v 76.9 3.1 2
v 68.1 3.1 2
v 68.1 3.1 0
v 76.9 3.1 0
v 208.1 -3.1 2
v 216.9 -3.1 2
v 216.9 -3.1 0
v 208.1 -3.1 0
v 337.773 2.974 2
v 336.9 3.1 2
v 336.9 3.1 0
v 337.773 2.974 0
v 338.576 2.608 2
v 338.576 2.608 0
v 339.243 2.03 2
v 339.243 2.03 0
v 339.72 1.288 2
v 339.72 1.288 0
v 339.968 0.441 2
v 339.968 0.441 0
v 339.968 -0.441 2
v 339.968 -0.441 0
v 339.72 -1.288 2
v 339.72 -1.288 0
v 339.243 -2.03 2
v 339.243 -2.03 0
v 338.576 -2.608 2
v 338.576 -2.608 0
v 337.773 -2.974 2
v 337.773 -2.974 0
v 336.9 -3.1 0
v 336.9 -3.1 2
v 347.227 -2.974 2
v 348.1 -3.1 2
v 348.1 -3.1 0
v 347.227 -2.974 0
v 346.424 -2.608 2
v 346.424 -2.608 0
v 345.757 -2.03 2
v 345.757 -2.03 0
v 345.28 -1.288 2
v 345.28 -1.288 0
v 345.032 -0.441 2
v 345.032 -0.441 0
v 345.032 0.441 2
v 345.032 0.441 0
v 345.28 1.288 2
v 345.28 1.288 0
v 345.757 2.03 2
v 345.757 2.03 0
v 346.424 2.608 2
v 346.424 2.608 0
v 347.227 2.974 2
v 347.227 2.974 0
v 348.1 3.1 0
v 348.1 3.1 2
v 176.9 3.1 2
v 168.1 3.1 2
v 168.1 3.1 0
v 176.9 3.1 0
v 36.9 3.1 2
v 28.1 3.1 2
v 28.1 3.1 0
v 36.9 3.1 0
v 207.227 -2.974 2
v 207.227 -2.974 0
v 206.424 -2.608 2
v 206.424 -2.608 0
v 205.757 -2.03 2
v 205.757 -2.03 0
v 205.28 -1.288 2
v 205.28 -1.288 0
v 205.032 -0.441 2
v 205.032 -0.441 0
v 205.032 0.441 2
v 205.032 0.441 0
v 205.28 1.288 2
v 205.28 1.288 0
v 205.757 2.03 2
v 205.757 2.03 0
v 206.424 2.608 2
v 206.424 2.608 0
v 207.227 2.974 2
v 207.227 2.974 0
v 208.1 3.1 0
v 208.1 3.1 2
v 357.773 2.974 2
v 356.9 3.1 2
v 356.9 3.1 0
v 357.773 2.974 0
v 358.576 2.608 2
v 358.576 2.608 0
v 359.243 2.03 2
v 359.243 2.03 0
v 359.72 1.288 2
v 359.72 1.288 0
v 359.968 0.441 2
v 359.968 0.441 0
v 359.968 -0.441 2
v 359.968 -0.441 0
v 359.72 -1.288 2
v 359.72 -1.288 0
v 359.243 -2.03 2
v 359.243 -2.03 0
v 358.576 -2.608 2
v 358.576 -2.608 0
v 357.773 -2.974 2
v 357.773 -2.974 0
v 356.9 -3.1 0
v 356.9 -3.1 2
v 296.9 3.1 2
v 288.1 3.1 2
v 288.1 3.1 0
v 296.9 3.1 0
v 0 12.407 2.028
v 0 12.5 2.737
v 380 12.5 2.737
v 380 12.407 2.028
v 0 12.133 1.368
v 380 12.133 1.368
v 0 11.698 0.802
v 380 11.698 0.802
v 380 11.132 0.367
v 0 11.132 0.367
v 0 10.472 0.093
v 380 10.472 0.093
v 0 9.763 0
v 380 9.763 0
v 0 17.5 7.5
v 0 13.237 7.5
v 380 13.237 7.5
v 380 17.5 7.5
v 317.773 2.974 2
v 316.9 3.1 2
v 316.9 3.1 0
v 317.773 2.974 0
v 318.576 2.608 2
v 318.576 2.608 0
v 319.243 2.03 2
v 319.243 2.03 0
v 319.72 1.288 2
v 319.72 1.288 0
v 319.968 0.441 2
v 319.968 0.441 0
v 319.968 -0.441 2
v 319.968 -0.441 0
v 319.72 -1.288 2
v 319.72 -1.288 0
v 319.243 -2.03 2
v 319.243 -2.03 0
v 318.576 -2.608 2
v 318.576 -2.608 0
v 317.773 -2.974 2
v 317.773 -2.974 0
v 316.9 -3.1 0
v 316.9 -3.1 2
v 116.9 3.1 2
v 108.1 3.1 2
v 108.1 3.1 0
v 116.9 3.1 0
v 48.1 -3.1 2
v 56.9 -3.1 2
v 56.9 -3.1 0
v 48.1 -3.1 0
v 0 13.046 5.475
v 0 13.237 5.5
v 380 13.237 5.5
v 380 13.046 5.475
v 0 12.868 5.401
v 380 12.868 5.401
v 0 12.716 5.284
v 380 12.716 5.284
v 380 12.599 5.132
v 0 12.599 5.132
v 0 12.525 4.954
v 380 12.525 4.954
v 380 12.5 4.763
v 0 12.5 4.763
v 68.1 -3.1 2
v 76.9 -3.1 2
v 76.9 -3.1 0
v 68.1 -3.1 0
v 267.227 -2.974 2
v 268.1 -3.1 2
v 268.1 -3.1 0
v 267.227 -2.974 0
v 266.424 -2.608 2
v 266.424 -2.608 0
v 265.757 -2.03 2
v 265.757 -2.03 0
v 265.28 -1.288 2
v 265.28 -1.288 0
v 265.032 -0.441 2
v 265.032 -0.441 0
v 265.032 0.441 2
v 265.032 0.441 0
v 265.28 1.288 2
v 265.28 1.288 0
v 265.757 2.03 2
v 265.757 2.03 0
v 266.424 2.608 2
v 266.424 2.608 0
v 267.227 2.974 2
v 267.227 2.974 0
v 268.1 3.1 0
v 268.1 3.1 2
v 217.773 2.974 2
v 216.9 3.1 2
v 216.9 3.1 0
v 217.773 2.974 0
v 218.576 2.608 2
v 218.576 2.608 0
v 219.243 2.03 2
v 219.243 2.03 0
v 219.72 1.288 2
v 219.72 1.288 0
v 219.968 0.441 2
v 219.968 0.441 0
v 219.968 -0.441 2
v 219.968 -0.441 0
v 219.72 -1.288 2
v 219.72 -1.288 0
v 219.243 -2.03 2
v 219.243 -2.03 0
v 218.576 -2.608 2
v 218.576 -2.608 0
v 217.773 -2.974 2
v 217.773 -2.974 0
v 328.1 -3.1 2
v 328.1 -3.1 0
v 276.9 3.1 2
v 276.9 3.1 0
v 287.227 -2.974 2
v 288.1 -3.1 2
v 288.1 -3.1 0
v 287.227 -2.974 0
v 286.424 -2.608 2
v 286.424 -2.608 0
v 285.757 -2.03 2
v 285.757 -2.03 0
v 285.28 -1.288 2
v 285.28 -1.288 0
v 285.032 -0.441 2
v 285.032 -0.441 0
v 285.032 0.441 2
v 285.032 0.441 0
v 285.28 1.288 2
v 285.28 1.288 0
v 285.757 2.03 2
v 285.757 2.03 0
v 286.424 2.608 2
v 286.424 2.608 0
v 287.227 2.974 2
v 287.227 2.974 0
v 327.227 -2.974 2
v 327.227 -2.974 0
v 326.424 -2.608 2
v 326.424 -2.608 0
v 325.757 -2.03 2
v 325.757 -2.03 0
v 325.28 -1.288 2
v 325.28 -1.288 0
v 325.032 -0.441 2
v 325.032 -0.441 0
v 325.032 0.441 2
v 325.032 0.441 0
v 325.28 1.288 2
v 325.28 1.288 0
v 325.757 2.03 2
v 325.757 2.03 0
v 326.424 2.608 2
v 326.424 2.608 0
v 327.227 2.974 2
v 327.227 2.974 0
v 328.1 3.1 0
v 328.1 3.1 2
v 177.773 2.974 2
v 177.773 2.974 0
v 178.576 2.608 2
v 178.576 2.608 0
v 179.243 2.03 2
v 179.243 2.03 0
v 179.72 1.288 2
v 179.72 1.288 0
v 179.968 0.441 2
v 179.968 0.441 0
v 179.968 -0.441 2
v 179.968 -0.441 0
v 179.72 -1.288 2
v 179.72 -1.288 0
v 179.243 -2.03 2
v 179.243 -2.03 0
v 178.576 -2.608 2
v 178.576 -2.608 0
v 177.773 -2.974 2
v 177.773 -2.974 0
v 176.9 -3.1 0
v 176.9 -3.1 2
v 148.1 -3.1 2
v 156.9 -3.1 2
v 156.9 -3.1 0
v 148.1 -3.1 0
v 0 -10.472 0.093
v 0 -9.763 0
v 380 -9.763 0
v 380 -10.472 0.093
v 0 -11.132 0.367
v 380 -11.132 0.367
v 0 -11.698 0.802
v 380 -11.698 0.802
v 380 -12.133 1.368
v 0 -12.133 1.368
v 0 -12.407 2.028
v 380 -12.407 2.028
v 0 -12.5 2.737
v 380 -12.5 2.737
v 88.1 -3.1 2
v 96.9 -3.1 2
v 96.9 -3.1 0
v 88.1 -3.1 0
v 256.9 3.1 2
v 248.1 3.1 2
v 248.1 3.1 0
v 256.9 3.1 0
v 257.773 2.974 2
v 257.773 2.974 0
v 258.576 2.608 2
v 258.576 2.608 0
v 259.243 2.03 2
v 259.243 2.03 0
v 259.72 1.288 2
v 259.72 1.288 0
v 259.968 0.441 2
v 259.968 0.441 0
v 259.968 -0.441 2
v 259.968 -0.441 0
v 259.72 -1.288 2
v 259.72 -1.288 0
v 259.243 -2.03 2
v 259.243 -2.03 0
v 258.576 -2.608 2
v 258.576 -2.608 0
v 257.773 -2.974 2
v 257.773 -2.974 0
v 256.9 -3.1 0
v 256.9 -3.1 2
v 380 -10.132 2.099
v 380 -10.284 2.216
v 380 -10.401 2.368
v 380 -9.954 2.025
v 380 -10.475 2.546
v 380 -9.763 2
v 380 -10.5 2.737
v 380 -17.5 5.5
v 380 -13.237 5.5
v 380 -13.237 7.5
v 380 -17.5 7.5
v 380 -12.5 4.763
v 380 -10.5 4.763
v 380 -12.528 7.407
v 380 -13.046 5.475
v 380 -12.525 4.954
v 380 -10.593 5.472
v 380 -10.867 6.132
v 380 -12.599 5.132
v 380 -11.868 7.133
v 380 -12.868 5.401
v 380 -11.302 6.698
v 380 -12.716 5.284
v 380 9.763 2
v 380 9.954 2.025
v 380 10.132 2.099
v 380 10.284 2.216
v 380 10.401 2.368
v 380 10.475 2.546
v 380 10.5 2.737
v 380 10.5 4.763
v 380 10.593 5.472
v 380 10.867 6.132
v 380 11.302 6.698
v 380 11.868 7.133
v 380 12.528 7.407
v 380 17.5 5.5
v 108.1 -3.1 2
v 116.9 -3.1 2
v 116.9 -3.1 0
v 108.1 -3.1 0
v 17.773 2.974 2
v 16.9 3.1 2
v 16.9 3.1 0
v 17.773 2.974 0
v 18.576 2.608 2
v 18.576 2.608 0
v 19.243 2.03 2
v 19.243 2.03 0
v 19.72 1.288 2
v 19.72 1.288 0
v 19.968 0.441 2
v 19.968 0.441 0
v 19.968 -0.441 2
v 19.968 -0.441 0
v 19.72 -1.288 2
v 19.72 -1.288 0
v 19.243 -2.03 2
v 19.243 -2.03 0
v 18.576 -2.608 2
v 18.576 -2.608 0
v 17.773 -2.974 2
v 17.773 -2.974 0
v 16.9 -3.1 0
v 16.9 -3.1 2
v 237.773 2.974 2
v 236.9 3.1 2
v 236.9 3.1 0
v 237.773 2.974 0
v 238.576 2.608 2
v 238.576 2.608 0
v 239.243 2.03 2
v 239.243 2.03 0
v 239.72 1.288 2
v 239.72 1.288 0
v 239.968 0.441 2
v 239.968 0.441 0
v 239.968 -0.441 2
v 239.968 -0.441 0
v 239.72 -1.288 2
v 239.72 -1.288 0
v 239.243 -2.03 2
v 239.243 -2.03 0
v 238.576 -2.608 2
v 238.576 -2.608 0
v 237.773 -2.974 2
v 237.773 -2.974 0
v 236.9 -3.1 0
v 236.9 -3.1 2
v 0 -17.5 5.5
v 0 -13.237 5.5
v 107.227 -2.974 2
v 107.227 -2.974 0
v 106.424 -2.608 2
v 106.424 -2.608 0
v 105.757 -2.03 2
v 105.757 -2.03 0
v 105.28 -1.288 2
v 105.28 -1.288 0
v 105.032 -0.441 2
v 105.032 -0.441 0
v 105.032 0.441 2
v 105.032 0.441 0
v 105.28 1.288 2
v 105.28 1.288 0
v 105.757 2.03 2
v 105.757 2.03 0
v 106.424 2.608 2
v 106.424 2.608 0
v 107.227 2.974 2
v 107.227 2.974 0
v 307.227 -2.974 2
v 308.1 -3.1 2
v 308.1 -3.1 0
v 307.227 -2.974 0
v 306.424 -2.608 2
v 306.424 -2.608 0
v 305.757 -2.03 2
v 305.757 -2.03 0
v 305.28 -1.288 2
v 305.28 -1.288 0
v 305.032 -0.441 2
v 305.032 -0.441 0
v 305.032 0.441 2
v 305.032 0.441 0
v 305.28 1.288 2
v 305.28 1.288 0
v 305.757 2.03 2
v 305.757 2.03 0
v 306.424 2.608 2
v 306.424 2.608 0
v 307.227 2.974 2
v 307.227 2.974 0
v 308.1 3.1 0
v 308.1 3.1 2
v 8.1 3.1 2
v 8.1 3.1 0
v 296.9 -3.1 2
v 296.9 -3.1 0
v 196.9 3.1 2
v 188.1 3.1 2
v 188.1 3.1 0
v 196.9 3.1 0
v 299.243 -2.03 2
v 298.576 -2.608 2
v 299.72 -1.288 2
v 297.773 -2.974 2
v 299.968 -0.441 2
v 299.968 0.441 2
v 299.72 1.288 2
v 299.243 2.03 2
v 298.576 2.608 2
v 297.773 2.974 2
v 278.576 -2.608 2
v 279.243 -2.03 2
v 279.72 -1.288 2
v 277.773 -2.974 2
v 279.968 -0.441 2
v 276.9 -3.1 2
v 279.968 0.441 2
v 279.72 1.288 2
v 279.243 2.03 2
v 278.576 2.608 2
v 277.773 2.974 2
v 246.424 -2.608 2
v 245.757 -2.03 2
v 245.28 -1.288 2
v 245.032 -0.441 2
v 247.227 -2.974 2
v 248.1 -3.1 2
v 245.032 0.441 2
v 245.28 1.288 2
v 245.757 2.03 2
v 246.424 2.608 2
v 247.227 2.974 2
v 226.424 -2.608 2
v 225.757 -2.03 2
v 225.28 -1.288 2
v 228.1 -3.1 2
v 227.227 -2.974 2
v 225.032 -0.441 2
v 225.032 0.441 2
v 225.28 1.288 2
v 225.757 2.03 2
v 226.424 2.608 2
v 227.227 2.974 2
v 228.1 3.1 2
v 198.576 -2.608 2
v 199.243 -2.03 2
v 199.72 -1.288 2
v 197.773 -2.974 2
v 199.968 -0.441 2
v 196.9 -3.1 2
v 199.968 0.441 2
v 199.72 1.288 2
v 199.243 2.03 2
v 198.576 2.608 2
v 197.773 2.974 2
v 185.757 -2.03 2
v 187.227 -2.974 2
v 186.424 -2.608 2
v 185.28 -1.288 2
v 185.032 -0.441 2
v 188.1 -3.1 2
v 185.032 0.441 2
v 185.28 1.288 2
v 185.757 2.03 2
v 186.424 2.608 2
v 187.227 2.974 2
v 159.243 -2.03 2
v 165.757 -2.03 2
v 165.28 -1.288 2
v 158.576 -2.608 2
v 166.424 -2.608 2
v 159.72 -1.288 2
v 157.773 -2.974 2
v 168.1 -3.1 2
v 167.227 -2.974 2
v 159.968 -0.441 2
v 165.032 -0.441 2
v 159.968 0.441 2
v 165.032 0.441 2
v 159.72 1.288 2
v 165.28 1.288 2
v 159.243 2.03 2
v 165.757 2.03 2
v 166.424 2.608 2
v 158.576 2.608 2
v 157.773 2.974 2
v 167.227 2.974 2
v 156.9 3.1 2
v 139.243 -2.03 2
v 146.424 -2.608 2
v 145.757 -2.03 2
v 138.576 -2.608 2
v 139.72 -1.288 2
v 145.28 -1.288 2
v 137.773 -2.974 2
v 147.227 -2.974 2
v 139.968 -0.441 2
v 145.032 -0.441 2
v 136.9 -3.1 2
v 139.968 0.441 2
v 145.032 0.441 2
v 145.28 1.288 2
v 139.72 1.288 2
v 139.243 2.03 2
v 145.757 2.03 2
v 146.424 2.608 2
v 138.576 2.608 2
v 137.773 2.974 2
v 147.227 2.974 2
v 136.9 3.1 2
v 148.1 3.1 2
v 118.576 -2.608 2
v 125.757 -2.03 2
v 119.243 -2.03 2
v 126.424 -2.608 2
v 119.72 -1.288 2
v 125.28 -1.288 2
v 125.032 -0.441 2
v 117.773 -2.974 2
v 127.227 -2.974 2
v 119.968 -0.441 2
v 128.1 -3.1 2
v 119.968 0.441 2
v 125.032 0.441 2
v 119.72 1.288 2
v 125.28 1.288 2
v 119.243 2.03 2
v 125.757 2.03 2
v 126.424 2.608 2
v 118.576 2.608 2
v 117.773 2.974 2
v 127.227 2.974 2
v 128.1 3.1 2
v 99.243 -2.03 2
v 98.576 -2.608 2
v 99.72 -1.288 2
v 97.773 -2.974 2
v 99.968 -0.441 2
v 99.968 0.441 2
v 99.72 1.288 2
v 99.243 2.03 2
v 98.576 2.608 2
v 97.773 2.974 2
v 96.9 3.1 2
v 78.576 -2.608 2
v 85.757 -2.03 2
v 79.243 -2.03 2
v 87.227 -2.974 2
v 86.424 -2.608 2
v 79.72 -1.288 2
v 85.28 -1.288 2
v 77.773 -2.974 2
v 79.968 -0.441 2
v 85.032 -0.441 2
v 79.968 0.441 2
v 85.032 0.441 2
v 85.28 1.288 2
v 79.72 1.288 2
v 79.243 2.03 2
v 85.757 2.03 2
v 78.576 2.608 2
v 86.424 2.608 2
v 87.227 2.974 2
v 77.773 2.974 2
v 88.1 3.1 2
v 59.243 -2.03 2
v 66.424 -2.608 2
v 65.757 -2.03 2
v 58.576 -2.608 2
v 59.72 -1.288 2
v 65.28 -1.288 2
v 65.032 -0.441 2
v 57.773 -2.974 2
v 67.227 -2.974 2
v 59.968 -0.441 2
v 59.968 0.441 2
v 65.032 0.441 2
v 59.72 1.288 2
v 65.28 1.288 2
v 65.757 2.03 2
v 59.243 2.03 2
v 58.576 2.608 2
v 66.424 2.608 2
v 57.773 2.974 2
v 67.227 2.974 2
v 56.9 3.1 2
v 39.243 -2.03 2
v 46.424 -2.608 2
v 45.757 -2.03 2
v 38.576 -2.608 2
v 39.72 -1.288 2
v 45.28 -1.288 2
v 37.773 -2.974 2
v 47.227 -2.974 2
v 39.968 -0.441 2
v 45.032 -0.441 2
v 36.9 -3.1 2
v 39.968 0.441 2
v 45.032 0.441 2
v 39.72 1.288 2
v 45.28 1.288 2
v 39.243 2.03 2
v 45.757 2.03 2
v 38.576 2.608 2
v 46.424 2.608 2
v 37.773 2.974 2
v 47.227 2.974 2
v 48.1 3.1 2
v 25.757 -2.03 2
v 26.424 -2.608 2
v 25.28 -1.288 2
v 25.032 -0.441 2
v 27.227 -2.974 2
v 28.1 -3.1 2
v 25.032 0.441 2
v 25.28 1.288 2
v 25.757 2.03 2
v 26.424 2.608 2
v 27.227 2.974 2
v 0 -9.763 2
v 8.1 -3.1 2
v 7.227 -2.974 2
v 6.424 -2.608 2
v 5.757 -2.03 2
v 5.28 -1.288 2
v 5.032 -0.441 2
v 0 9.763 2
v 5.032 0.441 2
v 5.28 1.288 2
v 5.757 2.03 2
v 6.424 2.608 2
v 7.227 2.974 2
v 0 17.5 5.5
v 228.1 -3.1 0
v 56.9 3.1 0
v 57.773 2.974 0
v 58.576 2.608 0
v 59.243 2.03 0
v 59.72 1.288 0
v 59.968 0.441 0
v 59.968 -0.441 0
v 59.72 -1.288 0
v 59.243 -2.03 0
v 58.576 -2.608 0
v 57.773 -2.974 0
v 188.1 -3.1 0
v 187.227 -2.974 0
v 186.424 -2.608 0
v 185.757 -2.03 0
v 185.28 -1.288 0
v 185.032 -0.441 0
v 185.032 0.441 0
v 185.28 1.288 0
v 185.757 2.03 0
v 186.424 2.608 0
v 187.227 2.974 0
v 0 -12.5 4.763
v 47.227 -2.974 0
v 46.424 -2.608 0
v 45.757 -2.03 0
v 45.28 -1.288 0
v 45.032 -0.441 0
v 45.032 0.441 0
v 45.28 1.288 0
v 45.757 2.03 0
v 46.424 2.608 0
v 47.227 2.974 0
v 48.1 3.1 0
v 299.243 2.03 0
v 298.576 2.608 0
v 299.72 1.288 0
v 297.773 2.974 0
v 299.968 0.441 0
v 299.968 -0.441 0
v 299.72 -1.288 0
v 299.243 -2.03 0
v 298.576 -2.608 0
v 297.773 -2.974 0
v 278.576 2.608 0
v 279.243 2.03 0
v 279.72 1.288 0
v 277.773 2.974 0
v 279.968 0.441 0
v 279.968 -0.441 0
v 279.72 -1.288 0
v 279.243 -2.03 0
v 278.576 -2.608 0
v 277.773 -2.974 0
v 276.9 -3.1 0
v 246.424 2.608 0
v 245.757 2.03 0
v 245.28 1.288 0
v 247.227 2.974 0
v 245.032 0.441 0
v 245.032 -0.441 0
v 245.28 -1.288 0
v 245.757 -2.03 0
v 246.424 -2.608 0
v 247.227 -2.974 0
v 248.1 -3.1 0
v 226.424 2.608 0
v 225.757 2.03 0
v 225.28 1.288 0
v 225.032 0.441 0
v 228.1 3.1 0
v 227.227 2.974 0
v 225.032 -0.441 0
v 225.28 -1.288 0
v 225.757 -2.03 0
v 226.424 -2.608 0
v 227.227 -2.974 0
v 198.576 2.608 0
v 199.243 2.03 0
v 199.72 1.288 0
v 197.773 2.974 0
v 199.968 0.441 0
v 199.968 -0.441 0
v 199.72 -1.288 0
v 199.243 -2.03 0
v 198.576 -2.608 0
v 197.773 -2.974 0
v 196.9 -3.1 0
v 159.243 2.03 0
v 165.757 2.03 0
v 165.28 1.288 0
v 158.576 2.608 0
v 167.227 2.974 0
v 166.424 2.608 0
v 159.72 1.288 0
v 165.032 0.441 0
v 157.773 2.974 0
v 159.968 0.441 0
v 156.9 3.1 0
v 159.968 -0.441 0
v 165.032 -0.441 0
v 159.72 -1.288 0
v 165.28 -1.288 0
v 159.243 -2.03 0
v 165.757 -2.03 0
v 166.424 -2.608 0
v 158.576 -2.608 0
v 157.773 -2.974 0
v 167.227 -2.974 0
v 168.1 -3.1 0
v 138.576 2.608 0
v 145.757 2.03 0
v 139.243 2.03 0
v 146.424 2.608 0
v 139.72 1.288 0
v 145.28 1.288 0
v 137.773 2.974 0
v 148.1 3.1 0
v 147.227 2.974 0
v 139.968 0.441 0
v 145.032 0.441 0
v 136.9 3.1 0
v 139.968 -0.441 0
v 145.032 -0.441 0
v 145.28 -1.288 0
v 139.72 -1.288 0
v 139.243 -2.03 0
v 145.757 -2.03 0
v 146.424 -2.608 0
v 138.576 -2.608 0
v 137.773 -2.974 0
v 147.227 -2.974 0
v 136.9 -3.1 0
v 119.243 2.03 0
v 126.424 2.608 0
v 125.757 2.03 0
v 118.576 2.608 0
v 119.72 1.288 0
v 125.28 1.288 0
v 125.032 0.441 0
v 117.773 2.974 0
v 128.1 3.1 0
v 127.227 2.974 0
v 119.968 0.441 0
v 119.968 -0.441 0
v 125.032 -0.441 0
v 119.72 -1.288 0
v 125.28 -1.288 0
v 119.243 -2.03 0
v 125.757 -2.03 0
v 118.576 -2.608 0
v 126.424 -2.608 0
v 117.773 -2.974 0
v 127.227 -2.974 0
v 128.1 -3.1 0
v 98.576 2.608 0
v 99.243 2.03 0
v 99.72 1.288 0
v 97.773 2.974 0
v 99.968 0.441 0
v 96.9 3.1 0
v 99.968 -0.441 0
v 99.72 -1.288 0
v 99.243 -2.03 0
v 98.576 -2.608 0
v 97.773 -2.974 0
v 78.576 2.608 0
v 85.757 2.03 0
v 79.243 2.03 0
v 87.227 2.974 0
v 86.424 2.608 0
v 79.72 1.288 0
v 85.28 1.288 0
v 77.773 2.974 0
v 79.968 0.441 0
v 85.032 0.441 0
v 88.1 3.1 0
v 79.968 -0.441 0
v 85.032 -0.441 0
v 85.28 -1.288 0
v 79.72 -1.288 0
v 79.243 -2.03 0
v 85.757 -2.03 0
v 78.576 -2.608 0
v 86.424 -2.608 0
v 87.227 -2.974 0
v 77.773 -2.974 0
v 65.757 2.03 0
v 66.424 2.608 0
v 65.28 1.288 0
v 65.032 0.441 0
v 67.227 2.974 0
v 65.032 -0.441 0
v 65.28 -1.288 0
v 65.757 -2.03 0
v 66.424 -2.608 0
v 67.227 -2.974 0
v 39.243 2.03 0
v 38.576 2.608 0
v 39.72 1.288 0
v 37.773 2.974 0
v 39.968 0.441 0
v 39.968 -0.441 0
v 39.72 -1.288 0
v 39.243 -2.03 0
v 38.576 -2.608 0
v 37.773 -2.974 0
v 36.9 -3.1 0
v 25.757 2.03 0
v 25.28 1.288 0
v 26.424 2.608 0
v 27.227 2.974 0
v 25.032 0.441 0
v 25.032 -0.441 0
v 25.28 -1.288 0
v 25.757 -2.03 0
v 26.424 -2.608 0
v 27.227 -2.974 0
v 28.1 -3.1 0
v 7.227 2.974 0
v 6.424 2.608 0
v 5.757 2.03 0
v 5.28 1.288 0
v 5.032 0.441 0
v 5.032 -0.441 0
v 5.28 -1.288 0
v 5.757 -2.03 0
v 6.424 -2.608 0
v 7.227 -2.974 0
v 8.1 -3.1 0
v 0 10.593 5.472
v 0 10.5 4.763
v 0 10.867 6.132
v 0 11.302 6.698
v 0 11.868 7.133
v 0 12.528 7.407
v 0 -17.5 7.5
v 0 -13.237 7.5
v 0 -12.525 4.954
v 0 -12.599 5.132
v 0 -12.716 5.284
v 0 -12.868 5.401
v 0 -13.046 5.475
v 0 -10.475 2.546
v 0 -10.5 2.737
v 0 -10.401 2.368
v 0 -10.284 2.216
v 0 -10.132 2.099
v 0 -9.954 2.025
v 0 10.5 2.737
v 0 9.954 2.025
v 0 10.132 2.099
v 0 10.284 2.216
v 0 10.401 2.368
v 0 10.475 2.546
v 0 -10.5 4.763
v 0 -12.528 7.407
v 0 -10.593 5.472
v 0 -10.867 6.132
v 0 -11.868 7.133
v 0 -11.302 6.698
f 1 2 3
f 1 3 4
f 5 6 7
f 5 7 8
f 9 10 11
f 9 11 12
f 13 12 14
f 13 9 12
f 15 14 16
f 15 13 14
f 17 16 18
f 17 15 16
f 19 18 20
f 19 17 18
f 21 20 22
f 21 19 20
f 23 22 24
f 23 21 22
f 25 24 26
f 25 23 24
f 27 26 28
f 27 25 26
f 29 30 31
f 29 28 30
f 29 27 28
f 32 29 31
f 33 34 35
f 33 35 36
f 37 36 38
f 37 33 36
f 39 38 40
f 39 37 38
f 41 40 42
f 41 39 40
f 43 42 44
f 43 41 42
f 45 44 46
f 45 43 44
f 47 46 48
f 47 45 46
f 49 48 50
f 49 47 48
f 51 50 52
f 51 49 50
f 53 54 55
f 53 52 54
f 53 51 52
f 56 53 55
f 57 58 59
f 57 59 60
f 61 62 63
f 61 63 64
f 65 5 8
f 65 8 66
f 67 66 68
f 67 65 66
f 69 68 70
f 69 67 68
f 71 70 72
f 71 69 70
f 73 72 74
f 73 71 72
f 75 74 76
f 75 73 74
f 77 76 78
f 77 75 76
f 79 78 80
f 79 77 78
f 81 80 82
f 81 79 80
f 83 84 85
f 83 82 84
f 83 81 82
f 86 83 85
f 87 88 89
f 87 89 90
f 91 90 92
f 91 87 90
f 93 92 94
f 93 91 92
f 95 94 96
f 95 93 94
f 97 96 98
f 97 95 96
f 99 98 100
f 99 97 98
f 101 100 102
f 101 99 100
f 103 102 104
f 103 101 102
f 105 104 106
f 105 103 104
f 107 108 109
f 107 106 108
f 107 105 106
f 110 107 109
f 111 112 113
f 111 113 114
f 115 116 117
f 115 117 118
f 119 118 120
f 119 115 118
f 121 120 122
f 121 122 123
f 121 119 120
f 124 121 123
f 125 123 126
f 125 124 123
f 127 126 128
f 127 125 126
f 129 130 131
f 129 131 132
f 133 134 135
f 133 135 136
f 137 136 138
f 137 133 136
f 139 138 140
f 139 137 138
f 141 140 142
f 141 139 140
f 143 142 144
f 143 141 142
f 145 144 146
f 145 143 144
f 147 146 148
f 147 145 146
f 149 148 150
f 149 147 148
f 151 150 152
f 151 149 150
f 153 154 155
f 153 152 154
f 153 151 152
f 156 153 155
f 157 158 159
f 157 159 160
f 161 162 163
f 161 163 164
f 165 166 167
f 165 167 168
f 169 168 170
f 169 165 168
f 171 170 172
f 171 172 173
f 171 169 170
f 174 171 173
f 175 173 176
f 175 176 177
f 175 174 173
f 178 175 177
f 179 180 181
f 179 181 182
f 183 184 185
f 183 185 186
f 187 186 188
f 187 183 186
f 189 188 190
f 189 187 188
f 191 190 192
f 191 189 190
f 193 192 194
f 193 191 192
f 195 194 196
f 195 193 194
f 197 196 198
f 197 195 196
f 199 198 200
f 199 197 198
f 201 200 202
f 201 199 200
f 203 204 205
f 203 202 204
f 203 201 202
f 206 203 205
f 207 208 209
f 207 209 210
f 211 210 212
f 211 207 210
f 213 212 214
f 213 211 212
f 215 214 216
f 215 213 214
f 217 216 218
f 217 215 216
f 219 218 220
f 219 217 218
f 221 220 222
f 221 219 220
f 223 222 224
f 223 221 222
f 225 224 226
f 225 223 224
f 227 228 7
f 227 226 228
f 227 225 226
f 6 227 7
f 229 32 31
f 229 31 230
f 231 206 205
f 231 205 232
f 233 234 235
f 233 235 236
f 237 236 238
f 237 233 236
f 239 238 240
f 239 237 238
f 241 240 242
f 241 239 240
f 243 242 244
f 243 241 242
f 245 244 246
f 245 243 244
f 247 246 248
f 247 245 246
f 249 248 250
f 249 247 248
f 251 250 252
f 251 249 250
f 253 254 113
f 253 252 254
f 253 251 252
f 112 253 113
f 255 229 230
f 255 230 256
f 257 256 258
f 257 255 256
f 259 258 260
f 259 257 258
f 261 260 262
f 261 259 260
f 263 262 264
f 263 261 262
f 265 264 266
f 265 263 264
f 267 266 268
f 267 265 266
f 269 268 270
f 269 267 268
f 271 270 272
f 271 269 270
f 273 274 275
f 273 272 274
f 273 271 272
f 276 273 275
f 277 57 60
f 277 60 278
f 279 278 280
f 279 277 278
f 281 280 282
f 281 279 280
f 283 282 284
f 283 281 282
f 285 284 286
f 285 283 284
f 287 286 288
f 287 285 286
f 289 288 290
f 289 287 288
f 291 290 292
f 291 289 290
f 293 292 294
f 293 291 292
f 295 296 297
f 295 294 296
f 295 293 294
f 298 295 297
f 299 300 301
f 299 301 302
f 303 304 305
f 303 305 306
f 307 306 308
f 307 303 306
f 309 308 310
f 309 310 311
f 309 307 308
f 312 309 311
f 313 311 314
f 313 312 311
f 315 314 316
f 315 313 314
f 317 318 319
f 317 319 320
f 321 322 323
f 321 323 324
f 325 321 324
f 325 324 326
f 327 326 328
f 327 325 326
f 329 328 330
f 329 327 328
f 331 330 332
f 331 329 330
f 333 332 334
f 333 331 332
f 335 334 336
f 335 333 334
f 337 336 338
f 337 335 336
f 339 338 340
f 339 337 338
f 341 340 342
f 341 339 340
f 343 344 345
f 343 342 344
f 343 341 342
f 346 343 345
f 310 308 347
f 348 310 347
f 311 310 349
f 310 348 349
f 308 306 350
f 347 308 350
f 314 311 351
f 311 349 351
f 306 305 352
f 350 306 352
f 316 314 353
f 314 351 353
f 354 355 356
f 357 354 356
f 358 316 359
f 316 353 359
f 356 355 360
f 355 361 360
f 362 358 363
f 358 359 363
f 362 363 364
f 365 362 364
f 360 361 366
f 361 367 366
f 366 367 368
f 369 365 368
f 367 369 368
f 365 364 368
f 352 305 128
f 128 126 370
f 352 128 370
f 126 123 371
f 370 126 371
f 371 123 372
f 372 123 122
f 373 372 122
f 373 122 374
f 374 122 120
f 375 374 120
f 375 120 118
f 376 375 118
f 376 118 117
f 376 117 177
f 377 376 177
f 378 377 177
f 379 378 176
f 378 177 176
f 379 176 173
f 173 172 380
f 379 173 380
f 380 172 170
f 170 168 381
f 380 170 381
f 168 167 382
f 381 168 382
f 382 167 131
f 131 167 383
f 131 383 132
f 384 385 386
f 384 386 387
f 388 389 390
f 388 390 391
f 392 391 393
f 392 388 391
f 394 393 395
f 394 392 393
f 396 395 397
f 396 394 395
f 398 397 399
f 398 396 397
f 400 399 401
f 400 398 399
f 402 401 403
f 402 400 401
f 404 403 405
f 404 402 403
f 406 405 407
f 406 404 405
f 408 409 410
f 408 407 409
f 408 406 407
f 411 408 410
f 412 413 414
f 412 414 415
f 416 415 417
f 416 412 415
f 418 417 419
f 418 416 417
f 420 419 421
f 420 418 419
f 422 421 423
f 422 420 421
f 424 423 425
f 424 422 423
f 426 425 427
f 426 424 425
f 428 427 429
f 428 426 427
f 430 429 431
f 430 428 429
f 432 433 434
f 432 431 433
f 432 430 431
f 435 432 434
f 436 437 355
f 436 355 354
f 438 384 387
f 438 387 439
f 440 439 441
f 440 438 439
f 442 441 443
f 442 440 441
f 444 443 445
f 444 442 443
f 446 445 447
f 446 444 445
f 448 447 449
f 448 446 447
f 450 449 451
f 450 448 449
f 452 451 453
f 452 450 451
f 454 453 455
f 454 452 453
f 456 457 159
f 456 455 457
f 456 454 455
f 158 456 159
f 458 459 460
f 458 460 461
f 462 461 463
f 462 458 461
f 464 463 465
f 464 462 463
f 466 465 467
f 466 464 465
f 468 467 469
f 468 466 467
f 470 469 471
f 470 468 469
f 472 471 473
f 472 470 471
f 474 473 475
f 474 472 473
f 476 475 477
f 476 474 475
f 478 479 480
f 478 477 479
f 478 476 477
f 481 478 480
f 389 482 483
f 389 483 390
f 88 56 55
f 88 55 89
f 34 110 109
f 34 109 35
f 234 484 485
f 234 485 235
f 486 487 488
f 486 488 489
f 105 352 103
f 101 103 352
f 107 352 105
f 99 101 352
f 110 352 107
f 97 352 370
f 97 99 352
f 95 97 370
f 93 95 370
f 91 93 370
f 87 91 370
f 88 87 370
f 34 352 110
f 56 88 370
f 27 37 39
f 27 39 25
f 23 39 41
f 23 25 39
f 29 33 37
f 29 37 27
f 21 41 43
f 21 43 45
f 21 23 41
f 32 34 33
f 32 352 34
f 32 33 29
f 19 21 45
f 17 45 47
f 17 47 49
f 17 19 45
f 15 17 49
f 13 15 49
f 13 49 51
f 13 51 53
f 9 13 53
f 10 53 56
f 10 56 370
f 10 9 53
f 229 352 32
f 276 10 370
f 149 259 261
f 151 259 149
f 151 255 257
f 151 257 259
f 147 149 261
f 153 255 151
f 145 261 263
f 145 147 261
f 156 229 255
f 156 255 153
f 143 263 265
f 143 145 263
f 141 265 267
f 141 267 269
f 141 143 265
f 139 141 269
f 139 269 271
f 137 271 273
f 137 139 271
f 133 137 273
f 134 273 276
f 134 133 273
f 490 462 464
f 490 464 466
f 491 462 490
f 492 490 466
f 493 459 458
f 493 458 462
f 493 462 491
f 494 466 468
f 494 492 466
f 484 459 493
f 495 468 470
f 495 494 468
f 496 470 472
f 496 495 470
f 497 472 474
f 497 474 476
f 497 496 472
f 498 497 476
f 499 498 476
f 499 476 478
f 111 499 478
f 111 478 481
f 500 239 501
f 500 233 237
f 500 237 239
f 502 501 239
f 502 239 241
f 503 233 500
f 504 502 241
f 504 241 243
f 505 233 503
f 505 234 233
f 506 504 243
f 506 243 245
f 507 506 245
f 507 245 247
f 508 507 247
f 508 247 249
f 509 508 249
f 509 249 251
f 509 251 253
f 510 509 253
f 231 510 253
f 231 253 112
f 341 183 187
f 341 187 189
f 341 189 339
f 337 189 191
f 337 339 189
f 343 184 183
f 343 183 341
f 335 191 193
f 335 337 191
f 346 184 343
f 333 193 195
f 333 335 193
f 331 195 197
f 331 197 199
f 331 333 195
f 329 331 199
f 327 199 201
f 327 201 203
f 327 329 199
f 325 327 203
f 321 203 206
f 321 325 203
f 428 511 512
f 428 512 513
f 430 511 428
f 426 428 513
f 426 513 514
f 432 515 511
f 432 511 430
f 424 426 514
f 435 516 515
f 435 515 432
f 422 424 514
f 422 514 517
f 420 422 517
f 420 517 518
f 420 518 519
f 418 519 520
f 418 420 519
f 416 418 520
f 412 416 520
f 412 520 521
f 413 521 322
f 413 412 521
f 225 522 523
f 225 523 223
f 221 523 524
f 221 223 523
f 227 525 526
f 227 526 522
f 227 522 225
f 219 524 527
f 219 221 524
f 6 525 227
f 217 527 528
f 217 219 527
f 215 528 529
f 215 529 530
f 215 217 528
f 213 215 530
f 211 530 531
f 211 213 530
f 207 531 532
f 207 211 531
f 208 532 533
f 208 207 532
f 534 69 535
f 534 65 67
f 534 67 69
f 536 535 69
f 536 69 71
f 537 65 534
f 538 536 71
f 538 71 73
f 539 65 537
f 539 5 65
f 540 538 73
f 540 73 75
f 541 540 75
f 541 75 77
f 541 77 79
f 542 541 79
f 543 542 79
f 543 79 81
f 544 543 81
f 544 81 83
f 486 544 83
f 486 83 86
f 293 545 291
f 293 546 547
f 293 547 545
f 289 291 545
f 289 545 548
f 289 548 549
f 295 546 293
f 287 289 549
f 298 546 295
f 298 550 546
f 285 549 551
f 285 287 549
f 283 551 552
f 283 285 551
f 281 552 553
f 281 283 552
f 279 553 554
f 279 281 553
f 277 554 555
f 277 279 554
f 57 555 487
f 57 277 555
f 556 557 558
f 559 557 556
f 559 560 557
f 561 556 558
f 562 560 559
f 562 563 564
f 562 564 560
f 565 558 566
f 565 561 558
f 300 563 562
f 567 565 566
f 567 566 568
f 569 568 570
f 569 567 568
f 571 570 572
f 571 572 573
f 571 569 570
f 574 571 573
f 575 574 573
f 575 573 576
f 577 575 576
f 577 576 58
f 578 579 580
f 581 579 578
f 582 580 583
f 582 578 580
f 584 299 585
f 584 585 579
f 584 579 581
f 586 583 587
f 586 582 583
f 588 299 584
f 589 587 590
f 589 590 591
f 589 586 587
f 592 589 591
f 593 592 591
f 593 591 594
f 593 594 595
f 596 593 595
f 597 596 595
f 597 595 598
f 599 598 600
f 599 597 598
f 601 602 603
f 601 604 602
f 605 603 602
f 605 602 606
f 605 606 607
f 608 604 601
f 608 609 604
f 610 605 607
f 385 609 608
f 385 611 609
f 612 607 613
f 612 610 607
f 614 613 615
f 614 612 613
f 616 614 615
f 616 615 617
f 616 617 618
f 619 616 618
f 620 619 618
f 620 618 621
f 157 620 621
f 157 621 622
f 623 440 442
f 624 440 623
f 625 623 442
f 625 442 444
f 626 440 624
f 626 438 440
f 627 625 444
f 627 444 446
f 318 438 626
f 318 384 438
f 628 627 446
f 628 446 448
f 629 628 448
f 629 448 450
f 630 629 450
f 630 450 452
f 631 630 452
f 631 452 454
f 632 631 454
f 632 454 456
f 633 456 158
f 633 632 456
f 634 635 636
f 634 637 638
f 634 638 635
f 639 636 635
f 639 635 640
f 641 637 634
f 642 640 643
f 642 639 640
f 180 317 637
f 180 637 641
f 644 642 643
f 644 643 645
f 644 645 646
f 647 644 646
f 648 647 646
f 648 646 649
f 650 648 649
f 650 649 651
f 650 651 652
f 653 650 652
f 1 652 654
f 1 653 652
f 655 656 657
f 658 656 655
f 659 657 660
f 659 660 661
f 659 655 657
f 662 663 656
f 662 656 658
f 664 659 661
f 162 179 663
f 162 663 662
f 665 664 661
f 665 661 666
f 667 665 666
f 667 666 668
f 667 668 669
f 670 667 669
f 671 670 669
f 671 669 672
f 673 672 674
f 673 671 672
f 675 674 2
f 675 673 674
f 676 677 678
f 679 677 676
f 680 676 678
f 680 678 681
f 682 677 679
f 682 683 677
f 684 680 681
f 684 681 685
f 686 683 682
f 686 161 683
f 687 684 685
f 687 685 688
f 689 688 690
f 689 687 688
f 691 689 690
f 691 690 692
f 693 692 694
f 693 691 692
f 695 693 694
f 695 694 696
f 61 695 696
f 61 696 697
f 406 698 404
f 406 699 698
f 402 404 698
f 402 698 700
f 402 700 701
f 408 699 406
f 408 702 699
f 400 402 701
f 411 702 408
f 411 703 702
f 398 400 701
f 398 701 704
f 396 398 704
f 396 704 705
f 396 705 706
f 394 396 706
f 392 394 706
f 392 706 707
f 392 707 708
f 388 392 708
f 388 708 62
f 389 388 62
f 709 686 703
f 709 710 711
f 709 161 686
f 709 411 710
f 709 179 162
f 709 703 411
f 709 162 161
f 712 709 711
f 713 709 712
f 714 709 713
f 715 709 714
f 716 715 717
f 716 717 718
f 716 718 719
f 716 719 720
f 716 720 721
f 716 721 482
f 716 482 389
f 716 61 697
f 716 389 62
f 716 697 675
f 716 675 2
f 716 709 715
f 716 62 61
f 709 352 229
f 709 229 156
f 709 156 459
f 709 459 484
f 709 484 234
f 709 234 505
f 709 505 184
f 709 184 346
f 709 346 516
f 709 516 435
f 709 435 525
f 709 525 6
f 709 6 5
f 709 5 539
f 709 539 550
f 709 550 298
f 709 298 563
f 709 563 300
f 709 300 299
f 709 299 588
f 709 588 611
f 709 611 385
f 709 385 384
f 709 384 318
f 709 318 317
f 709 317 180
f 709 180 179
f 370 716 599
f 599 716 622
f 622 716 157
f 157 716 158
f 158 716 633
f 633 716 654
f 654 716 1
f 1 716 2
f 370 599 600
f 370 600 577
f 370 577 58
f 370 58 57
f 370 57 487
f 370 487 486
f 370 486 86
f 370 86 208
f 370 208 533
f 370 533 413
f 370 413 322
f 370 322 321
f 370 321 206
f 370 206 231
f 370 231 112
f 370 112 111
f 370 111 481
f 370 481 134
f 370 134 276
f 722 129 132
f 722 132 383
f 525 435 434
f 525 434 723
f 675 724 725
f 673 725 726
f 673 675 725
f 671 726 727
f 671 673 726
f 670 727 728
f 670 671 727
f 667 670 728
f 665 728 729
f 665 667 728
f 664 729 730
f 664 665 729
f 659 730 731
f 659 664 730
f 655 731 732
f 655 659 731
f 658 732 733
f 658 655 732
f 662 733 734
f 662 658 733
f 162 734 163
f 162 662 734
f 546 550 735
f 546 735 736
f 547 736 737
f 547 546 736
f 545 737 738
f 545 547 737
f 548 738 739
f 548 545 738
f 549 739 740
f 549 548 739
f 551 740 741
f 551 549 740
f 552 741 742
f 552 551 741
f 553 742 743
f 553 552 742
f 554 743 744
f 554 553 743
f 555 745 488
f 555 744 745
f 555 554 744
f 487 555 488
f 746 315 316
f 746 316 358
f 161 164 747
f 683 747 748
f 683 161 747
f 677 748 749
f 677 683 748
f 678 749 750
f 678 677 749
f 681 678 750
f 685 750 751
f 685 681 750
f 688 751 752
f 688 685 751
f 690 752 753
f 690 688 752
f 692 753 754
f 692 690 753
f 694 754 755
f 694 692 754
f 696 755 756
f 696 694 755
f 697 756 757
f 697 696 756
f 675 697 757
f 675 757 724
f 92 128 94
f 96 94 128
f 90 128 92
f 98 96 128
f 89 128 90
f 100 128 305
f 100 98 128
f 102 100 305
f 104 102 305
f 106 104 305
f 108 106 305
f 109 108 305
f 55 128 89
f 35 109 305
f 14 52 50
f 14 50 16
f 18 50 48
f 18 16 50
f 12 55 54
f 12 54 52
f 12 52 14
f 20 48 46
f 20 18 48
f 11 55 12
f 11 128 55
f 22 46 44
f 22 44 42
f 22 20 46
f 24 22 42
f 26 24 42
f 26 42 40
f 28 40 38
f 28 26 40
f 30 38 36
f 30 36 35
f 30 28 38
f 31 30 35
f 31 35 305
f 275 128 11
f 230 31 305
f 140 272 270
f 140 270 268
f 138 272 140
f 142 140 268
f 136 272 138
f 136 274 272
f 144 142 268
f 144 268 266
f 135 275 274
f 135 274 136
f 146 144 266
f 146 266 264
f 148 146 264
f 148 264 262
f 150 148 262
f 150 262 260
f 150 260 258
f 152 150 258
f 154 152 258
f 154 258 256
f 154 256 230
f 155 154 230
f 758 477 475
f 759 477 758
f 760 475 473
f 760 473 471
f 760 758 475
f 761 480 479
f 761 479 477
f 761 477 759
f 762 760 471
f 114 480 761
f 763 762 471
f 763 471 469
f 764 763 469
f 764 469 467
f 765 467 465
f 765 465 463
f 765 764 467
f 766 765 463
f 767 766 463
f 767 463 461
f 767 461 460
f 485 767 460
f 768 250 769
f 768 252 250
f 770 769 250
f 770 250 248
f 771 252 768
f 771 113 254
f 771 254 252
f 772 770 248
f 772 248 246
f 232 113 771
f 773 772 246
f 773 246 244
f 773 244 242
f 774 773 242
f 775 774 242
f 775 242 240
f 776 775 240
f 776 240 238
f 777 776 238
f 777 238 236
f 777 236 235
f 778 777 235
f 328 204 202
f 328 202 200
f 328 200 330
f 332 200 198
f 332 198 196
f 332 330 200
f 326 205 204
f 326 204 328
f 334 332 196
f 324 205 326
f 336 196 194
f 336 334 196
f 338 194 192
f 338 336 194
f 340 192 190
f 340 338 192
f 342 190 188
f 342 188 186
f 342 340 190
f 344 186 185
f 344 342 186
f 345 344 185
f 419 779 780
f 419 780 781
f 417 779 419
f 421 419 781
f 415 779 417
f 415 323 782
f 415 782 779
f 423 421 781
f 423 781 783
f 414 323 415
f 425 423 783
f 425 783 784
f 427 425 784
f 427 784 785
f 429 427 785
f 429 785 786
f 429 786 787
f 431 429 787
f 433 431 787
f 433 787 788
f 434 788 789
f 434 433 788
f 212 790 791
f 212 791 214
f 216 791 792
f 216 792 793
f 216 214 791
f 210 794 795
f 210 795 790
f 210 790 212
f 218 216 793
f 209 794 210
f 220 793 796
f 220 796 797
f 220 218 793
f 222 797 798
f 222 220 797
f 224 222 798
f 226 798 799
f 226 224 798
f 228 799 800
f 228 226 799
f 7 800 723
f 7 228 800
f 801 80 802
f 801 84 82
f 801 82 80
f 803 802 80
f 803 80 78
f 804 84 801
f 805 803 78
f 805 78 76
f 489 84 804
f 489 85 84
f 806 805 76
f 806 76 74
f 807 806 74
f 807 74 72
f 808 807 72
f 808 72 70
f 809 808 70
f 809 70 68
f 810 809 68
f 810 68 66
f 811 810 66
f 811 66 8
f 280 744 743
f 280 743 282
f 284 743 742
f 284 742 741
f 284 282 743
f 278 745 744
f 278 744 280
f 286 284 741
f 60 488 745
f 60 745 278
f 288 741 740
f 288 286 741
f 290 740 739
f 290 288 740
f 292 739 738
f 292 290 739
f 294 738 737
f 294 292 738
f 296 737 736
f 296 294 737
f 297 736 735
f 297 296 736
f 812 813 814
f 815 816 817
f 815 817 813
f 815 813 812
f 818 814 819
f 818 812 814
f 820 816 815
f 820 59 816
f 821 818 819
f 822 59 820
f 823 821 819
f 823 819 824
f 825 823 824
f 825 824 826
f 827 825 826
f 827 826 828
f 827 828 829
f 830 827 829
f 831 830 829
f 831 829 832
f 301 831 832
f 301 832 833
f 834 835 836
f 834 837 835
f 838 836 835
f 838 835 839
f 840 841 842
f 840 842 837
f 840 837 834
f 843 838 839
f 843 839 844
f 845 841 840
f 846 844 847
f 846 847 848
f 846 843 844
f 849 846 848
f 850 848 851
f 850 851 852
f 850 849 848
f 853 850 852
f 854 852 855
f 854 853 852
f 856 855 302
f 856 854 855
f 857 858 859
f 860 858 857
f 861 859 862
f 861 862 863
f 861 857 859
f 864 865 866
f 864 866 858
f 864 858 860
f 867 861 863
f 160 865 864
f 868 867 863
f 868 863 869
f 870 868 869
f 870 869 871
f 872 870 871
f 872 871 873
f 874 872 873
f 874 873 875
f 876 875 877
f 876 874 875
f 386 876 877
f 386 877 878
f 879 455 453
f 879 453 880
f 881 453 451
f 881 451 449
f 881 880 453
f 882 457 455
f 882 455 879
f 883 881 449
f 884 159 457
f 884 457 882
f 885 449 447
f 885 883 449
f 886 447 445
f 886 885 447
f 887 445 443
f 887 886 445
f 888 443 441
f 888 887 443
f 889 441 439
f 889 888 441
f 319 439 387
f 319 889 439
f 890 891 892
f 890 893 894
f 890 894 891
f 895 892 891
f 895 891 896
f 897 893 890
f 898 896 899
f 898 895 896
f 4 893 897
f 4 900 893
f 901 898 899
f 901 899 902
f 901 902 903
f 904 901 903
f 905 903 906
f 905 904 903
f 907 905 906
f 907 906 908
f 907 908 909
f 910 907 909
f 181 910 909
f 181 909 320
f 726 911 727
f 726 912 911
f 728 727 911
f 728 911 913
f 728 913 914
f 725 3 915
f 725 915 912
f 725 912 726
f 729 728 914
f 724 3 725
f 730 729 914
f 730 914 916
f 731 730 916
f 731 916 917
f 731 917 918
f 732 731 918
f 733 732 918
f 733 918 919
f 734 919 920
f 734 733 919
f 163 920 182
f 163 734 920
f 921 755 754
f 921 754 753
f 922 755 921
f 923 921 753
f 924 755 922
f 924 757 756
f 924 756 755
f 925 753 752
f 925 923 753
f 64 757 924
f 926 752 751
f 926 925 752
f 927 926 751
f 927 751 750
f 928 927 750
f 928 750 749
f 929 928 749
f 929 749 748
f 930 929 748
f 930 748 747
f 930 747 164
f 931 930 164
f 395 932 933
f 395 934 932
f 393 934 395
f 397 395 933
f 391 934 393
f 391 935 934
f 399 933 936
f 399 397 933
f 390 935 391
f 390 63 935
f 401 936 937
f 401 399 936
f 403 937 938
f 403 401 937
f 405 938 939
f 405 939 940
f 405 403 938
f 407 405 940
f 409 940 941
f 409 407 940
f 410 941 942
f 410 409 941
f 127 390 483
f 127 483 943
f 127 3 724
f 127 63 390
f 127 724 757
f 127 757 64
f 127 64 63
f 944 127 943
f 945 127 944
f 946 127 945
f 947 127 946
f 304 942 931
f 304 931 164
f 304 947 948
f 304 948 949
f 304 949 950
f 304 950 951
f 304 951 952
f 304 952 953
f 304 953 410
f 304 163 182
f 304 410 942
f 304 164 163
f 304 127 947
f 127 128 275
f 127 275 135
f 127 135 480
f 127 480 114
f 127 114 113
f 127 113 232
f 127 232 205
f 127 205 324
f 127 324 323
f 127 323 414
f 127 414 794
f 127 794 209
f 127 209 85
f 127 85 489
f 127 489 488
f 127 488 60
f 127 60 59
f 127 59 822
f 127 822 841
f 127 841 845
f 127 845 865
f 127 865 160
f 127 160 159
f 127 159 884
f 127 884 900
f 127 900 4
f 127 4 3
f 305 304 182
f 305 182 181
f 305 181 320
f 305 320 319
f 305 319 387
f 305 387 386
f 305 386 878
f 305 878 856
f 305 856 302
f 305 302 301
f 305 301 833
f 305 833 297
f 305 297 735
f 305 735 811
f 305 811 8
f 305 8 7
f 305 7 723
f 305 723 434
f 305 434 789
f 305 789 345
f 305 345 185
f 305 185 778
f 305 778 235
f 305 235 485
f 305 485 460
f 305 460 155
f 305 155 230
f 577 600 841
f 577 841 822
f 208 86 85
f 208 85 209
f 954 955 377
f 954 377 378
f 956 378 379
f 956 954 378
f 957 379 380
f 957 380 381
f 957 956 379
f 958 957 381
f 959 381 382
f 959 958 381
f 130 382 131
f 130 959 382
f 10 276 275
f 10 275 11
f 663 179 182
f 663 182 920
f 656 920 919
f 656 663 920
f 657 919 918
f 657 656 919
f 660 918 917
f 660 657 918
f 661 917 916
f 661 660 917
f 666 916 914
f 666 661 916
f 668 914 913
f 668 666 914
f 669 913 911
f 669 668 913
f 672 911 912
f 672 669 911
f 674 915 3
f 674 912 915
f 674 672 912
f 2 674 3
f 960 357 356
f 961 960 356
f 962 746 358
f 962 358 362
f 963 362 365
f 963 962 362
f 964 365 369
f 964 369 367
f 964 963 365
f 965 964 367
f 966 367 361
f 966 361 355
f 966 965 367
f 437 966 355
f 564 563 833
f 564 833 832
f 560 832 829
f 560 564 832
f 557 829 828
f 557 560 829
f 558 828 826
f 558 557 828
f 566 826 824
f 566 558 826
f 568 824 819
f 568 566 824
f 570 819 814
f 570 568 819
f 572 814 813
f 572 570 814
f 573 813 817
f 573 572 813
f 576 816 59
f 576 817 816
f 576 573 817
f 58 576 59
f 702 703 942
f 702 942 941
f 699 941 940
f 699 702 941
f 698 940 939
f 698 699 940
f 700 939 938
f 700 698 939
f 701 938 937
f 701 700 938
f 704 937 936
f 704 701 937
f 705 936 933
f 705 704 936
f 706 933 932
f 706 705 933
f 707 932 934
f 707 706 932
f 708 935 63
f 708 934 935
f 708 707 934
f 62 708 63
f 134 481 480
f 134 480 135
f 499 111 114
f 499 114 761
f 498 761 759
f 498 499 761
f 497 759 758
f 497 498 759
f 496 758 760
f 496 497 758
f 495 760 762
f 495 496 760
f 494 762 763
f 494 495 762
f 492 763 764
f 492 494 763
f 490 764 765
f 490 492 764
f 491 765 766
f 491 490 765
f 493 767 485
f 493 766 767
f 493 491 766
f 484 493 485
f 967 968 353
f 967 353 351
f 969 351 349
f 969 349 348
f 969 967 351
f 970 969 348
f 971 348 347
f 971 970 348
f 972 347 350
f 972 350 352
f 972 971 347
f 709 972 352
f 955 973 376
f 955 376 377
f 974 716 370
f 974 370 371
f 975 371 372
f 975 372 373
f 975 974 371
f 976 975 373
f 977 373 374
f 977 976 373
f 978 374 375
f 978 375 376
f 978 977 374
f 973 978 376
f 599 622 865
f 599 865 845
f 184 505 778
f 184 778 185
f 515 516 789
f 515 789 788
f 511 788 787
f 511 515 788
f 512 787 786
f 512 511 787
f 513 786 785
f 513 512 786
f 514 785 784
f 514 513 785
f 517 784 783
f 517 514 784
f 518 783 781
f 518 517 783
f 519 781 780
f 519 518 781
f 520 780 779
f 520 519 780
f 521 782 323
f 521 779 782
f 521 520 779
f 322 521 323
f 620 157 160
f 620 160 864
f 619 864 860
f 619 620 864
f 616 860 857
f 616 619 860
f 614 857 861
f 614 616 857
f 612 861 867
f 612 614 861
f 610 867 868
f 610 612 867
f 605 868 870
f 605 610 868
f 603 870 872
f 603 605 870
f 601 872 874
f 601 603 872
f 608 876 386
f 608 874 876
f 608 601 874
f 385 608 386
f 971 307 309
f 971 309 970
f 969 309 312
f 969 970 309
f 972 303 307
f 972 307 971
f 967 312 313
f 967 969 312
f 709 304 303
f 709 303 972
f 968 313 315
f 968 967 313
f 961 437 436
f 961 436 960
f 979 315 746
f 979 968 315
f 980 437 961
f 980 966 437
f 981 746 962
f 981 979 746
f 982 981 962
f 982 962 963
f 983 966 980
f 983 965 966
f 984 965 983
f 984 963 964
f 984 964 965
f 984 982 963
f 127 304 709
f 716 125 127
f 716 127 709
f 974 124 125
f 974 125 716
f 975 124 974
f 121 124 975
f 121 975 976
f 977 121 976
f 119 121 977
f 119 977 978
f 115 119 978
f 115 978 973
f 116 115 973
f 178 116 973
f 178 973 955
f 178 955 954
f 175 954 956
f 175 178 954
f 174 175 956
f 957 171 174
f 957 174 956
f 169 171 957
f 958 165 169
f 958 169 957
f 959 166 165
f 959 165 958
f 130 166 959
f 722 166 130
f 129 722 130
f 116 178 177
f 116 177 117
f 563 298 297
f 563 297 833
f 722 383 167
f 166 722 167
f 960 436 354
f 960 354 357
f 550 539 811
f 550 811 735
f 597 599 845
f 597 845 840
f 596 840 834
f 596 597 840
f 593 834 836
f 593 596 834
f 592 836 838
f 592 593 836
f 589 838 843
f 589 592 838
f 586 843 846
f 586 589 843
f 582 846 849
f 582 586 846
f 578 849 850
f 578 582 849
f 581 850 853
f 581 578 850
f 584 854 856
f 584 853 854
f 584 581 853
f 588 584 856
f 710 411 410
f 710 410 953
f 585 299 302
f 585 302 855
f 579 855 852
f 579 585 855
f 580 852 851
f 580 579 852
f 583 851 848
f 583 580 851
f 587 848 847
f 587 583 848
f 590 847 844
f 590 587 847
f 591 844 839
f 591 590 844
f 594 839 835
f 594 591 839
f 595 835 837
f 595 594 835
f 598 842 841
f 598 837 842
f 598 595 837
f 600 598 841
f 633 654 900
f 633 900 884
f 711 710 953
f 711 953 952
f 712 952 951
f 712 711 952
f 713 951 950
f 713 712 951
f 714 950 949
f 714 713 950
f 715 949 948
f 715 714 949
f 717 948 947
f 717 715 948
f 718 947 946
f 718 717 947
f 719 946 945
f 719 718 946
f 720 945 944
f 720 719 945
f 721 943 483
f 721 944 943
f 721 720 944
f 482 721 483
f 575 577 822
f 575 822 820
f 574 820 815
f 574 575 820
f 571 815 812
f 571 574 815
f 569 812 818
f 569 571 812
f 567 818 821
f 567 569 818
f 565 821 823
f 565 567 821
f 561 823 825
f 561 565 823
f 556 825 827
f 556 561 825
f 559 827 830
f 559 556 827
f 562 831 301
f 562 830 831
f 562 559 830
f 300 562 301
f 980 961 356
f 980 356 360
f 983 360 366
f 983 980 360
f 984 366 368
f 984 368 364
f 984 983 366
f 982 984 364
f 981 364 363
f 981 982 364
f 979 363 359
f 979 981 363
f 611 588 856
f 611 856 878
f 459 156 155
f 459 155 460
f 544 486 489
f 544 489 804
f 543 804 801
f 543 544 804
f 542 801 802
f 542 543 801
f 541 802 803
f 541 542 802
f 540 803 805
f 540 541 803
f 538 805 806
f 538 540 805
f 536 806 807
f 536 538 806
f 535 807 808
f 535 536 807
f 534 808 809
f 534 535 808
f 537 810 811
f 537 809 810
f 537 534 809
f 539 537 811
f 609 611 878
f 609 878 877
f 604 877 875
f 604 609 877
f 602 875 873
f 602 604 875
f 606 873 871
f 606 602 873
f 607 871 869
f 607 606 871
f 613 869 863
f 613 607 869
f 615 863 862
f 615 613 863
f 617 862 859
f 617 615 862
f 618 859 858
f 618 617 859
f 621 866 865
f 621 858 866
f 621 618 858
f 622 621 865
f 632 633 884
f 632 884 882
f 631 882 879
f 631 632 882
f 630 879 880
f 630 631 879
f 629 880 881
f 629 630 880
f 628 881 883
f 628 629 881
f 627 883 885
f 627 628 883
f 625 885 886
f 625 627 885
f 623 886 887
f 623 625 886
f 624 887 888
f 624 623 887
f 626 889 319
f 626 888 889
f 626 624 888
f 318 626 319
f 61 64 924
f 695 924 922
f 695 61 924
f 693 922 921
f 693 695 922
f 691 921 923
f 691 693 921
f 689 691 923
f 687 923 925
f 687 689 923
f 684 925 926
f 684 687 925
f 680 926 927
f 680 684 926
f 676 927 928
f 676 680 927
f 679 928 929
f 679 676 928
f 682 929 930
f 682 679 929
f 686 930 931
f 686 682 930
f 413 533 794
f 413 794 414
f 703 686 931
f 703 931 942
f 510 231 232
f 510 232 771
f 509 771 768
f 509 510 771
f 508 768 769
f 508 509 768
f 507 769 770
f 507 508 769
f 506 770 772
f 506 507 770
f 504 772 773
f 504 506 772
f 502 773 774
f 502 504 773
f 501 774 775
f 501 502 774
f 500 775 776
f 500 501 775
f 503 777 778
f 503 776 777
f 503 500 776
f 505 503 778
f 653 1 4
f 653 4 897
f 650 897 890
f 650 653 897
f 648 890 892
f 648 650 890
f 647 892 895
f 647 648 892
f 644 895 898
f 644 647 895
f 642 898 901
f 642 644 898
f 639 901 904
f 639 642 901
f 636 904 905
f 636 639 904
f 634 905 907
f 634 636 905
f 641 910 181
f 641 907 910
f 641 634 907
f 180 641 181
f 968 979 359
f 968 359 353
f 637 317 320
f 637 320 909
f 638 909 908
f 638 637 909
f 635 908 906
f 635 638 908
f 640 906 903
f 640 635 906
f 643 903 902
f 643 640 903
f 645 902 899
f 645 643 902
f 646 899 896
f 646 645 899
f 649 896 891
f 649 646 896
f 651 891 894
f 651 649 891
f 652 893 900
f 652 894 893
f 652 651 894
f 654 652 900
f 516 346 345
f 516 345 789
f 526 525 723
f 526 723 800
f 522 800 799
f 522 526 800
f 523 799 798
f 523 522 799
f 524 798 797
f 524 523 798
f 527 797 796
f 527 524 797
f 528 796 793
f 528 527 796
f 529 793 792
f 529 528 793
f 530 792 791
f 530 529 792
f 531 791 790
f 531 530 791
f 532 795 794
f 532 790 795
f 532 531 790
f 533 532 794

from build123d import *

# Parameters (mm, degrees)
TABAN_FLAN_4_DEPTH     = 380
KES_EKSTR_ZYON11_DEPTH = 10


# Sheet-metal steps are written as plain solids
with BuildPart() as part:
    # Çizim18 → Taban-Flanş4 (new body)
    with BuildSketch(Plane(origin=(0, 0, 0), x_dir=(0, 0, -1), z_dir=(1, 0, 0))):
        with BuildLine():
            Line((-5.5, 17.5), (-5.5, 13.2366))
            ThreePointArc((-5.5, 13.2366), (-5.284254855, 12.715745145), (-4.7634, 12.5))
            Line((-4.7634, 12.5), (-2.7366, 12.5))
            ThreePointArc((-2.7366, 12.5), (-0.801531583, 11.698468417), (0, 9.7634))
            Line((0, 9.7634), (0, -9.7634))
            ThreePointArc((0, -9.7634), (-0.801531583, -11.698468417), (-2.7366, -12.5))
            Line((-2.7366, -12.5), (-4.7634, -12.5))
            ThreePointArc((-4.7634, -12.5), (-5.284254855, -12.715745145), (-5.5, -13.2366))
            Line((-5.5, -13.2366), (-5.5, -17.5))
            Line((-5.5, -17.5), (-7.5, -17.5))
            Line((-7.5, -17.5), (-7.5, -13.2366))
            ThreePointArc((-7.5, -13.2366), (-6.698468417, -11.301531583), (-4.7634, -10.5))
            Line((-4.7634, -10.5), (-2.7366, -10.5))
            ThreePointArc((-2.7366, -10.5), (-2.215745145, -10.284254855), (-2, -9.7634))
            Line((-2, -9.7634), (-2, 9.7634))
            ThreePointArc((-2, 9.7634), (-2.215745145, 10.284254855), (-2.7366, 10.5))
            Line((-2.7366, 10.5), (-4.7634, 10.5))
            ThreePointArc((-4.7634, 10.5), (-6.698468417, 11.301531583), (-7.5, 13.2366))
            Line((-7.5, 13.2366), (-7.5, 17.5))
            Line((-7.5, 17.5), (-5.5, 17.5))
        make_face()
    extrude(amount=TABAN_FLAN_4_DEPTH)

    # Çizim21 → Kes-Ekstrüzyon11 (cut)
    with BuildSketch(Plane.XY.offset(2)):
        with BuildLine():
            Line((8.1, 3.1), (16.9, 3.1))
            ThreePointArc((16.9, 3.1), (20, 0), (16.9, -3.1))
            Line((16.9, -3.1), (8.1, -3.1))
            ThreePointArc((8.1, -3.1), (5, 0), (8.1, 3.1))
        make_face()
        with BuildLine():
            Line((28.1, 3.1), (36.9, 3.1))
            ThreePointArc((36.9, 3.1), (40, 0), (36.9, -3.1))
            Line((36.9, -3.1), (28.1, -3.1))
            ThreePointArc((28.1, -3.1), (25, 0), (28.1, 3.1))
        make_face()
        with BuildLine():
            Line((48.1, 3.1), (56.9, 3.1))
            ThreePointArc((56.9, 3.1), (60, 0), (56.9, -3.1))
            Line((56.9, -3.1), (48.1, -3.1))
            ThreePointArc((48.1, -3.1), (45, 0), (48.1, 3.1))
        make_face()
        with BuildLine():
            Line((68.1, 3.1), (76.9, 3.1))
            ThreePointArc((76.9, 3.1), (80, 0), (76.9, -3.1))
            Line((76.9, -3.1), (68.1, -3.1))
            ThreePointArc((68.1, -3.1), (65, 0), (68.1, 3.1))
        make_face()
        with BuildLine():
            Line((88.1, 3.1), (96.9, 3.1))
            ThreePointArc((96.9, 3.1), (100, 0), (96.9, -3.1))
            Line((96.9, -3.1), (88.1, -3.1))
            ThreePointArc((88.1, -3.1), (85, 0), (88.1, 3.1))
        make_face()
        with BuildLine():
            Line((108.1, 3.1), (116.9, 3.1))
            ThreePointArc((116.9, 3.1), (120, 0), (116.9, -3.1))
            Line((116.9, -3.1), (108.1, -3.1))
            ThreePointArc((108.1, -3.1), (105, 0), (108.1, 3.1))
        make_face()
        with BuildLine():
            Line((128.1, 3.1), (136.9, 3.1))
            ThreePointArc((136.9, 3.1), (140, 0), (136.9, -3.1))
            Line((136.9, -3.1), (128.1, -3.1))
            ThreePointArc((128.1, -3.1), (125, 0), (128.1, 3.1))
        make_face()
        with BuildLine():
            Line((148.1, 3.1), (156.9, 3.1))
            ThreePointArc((156.9, 3.1), (160, 0), (156.9, -3.1))
            Line((156.9, -3.1), (148.1, -3.1))
            ThreePointArc((148.1, -3.1), (145, 0), (148.1, 3.1))
        make_face()
        with BuildLine():
            Line((168.1, 3.1), (176.9, 3.1))
            ThreePointArc((176.9, 3.1), (180, 0), (176.9, -3.1))
            Line((176.9, -3.1), (168.1, -3.1))
            ThreePointArc((168.1, -3.1), (165, 0), (168.1, 3.1))
        make_face()
        with BuildLine():
            Line((188.1, 3.1), (196.9, 3.1))
            ThreePointArc((196.9, 3.1), (200, 0), (196.9, -3.1))
            Line((196.9, -3.1), (188.1, -3.1))
            ThreePointArc((188.1, -3.1), (185, 0), (188.1, 3.1))
        make_face()
        with BuildLine():
            Line((208.1, 3.1), (216.9, 3.1))
            ThreePointArc((216.9, 3.1), (220, 0), (216.9, -3.1))
            Line((216.9, -3.1), (208.1, -3.1))
            ThreePointArc((208.1, -3.1), (205, 0), (208.1, 3.1))
        make_face()
        with BuildLine():
            Line((228.1, 3.1), (236.9, 3.1))
            ThreePointArc((236.9, 3.1), (240, 0), (236.9, -3.1))
            Line((236.9, -3.1), (228.1, -3.1))
            ThreePointArc((228.1, -3.1), (225, 0), (228.1, 3.1))
        make_face()
        with BuildLine():
            Line((248.1, 3.1), (256.9, 3.1))
            ThreePointArc((256.9, 3.1), (260, 0), (256.9, -3.1))
            Line((256.9, -3.1), (248.1, -3.1))
            ThreePointArc((248.1, -3.1), (245, 0), (248.1, 3.1))
        make_face()
        with BuildLine():
            Line((268.1, 3.1), (276.9, 3.1))
            ThreePointArc((276.9, 3.1), (280, 0), (276.9, -3.1))
            Line((276.9, -3.1), (268.1, -3.1))
            ThreePointArc((268.1, -3.1), (265, 0), (268.1, 3.1))
        make_face()
        with BuildLine():
            Line((288.1, 3.1), (296.9, 3.1))
            ThreePointArc((296.9, 3.1), (300, 0), (296.9, -3.1))
            Line((296.9, -3.1), (288.1, -3.1))
            ThreePointArc((288.1, -3.1), (285, 0), (288.1, 3.1))
        make_face()
        with BuildLine():
            Line((308.1, 3.1), (316.9, 3.1))
            ThreePointArc((316.9, 3.1), (320, 0), (316.9, -3.1))
            Line((316.9, -3.1), (308.1, -3.1))
            ThreePointArc((308.1, -3.1), (305, 0), (308.1, 3.1))
        make_face()
        with BuildLine():
            Line((328.1, 3.1), (336.9, 3.1))
            ThreePointArc((336.9, 3.1), (340, 0), (336.9, -3.1))
            Line((336.9, -3.1), (328.1, -3.1))
            ThreePointArc((328.1, -3.1), (325, 0), (328.1, 3.1))
        make_face()
        with BuildLine():
            Line((348.1, 3.1), (356.9, 3.1))
            ThreePointArc((356.9, 3.1), (360, 0), (356.9, -3.1))
            Line((356.9, -3.1), (348.1, -3.1))
            ThreePointArc((348.1, -3.1), (345, 0), (348.1, 3.1))
        make_face()
    extrude(amount=-KES_EKSTR_ZYON11_DEPTH, mode=Mode.SUBTRACT)


solid = part.part
